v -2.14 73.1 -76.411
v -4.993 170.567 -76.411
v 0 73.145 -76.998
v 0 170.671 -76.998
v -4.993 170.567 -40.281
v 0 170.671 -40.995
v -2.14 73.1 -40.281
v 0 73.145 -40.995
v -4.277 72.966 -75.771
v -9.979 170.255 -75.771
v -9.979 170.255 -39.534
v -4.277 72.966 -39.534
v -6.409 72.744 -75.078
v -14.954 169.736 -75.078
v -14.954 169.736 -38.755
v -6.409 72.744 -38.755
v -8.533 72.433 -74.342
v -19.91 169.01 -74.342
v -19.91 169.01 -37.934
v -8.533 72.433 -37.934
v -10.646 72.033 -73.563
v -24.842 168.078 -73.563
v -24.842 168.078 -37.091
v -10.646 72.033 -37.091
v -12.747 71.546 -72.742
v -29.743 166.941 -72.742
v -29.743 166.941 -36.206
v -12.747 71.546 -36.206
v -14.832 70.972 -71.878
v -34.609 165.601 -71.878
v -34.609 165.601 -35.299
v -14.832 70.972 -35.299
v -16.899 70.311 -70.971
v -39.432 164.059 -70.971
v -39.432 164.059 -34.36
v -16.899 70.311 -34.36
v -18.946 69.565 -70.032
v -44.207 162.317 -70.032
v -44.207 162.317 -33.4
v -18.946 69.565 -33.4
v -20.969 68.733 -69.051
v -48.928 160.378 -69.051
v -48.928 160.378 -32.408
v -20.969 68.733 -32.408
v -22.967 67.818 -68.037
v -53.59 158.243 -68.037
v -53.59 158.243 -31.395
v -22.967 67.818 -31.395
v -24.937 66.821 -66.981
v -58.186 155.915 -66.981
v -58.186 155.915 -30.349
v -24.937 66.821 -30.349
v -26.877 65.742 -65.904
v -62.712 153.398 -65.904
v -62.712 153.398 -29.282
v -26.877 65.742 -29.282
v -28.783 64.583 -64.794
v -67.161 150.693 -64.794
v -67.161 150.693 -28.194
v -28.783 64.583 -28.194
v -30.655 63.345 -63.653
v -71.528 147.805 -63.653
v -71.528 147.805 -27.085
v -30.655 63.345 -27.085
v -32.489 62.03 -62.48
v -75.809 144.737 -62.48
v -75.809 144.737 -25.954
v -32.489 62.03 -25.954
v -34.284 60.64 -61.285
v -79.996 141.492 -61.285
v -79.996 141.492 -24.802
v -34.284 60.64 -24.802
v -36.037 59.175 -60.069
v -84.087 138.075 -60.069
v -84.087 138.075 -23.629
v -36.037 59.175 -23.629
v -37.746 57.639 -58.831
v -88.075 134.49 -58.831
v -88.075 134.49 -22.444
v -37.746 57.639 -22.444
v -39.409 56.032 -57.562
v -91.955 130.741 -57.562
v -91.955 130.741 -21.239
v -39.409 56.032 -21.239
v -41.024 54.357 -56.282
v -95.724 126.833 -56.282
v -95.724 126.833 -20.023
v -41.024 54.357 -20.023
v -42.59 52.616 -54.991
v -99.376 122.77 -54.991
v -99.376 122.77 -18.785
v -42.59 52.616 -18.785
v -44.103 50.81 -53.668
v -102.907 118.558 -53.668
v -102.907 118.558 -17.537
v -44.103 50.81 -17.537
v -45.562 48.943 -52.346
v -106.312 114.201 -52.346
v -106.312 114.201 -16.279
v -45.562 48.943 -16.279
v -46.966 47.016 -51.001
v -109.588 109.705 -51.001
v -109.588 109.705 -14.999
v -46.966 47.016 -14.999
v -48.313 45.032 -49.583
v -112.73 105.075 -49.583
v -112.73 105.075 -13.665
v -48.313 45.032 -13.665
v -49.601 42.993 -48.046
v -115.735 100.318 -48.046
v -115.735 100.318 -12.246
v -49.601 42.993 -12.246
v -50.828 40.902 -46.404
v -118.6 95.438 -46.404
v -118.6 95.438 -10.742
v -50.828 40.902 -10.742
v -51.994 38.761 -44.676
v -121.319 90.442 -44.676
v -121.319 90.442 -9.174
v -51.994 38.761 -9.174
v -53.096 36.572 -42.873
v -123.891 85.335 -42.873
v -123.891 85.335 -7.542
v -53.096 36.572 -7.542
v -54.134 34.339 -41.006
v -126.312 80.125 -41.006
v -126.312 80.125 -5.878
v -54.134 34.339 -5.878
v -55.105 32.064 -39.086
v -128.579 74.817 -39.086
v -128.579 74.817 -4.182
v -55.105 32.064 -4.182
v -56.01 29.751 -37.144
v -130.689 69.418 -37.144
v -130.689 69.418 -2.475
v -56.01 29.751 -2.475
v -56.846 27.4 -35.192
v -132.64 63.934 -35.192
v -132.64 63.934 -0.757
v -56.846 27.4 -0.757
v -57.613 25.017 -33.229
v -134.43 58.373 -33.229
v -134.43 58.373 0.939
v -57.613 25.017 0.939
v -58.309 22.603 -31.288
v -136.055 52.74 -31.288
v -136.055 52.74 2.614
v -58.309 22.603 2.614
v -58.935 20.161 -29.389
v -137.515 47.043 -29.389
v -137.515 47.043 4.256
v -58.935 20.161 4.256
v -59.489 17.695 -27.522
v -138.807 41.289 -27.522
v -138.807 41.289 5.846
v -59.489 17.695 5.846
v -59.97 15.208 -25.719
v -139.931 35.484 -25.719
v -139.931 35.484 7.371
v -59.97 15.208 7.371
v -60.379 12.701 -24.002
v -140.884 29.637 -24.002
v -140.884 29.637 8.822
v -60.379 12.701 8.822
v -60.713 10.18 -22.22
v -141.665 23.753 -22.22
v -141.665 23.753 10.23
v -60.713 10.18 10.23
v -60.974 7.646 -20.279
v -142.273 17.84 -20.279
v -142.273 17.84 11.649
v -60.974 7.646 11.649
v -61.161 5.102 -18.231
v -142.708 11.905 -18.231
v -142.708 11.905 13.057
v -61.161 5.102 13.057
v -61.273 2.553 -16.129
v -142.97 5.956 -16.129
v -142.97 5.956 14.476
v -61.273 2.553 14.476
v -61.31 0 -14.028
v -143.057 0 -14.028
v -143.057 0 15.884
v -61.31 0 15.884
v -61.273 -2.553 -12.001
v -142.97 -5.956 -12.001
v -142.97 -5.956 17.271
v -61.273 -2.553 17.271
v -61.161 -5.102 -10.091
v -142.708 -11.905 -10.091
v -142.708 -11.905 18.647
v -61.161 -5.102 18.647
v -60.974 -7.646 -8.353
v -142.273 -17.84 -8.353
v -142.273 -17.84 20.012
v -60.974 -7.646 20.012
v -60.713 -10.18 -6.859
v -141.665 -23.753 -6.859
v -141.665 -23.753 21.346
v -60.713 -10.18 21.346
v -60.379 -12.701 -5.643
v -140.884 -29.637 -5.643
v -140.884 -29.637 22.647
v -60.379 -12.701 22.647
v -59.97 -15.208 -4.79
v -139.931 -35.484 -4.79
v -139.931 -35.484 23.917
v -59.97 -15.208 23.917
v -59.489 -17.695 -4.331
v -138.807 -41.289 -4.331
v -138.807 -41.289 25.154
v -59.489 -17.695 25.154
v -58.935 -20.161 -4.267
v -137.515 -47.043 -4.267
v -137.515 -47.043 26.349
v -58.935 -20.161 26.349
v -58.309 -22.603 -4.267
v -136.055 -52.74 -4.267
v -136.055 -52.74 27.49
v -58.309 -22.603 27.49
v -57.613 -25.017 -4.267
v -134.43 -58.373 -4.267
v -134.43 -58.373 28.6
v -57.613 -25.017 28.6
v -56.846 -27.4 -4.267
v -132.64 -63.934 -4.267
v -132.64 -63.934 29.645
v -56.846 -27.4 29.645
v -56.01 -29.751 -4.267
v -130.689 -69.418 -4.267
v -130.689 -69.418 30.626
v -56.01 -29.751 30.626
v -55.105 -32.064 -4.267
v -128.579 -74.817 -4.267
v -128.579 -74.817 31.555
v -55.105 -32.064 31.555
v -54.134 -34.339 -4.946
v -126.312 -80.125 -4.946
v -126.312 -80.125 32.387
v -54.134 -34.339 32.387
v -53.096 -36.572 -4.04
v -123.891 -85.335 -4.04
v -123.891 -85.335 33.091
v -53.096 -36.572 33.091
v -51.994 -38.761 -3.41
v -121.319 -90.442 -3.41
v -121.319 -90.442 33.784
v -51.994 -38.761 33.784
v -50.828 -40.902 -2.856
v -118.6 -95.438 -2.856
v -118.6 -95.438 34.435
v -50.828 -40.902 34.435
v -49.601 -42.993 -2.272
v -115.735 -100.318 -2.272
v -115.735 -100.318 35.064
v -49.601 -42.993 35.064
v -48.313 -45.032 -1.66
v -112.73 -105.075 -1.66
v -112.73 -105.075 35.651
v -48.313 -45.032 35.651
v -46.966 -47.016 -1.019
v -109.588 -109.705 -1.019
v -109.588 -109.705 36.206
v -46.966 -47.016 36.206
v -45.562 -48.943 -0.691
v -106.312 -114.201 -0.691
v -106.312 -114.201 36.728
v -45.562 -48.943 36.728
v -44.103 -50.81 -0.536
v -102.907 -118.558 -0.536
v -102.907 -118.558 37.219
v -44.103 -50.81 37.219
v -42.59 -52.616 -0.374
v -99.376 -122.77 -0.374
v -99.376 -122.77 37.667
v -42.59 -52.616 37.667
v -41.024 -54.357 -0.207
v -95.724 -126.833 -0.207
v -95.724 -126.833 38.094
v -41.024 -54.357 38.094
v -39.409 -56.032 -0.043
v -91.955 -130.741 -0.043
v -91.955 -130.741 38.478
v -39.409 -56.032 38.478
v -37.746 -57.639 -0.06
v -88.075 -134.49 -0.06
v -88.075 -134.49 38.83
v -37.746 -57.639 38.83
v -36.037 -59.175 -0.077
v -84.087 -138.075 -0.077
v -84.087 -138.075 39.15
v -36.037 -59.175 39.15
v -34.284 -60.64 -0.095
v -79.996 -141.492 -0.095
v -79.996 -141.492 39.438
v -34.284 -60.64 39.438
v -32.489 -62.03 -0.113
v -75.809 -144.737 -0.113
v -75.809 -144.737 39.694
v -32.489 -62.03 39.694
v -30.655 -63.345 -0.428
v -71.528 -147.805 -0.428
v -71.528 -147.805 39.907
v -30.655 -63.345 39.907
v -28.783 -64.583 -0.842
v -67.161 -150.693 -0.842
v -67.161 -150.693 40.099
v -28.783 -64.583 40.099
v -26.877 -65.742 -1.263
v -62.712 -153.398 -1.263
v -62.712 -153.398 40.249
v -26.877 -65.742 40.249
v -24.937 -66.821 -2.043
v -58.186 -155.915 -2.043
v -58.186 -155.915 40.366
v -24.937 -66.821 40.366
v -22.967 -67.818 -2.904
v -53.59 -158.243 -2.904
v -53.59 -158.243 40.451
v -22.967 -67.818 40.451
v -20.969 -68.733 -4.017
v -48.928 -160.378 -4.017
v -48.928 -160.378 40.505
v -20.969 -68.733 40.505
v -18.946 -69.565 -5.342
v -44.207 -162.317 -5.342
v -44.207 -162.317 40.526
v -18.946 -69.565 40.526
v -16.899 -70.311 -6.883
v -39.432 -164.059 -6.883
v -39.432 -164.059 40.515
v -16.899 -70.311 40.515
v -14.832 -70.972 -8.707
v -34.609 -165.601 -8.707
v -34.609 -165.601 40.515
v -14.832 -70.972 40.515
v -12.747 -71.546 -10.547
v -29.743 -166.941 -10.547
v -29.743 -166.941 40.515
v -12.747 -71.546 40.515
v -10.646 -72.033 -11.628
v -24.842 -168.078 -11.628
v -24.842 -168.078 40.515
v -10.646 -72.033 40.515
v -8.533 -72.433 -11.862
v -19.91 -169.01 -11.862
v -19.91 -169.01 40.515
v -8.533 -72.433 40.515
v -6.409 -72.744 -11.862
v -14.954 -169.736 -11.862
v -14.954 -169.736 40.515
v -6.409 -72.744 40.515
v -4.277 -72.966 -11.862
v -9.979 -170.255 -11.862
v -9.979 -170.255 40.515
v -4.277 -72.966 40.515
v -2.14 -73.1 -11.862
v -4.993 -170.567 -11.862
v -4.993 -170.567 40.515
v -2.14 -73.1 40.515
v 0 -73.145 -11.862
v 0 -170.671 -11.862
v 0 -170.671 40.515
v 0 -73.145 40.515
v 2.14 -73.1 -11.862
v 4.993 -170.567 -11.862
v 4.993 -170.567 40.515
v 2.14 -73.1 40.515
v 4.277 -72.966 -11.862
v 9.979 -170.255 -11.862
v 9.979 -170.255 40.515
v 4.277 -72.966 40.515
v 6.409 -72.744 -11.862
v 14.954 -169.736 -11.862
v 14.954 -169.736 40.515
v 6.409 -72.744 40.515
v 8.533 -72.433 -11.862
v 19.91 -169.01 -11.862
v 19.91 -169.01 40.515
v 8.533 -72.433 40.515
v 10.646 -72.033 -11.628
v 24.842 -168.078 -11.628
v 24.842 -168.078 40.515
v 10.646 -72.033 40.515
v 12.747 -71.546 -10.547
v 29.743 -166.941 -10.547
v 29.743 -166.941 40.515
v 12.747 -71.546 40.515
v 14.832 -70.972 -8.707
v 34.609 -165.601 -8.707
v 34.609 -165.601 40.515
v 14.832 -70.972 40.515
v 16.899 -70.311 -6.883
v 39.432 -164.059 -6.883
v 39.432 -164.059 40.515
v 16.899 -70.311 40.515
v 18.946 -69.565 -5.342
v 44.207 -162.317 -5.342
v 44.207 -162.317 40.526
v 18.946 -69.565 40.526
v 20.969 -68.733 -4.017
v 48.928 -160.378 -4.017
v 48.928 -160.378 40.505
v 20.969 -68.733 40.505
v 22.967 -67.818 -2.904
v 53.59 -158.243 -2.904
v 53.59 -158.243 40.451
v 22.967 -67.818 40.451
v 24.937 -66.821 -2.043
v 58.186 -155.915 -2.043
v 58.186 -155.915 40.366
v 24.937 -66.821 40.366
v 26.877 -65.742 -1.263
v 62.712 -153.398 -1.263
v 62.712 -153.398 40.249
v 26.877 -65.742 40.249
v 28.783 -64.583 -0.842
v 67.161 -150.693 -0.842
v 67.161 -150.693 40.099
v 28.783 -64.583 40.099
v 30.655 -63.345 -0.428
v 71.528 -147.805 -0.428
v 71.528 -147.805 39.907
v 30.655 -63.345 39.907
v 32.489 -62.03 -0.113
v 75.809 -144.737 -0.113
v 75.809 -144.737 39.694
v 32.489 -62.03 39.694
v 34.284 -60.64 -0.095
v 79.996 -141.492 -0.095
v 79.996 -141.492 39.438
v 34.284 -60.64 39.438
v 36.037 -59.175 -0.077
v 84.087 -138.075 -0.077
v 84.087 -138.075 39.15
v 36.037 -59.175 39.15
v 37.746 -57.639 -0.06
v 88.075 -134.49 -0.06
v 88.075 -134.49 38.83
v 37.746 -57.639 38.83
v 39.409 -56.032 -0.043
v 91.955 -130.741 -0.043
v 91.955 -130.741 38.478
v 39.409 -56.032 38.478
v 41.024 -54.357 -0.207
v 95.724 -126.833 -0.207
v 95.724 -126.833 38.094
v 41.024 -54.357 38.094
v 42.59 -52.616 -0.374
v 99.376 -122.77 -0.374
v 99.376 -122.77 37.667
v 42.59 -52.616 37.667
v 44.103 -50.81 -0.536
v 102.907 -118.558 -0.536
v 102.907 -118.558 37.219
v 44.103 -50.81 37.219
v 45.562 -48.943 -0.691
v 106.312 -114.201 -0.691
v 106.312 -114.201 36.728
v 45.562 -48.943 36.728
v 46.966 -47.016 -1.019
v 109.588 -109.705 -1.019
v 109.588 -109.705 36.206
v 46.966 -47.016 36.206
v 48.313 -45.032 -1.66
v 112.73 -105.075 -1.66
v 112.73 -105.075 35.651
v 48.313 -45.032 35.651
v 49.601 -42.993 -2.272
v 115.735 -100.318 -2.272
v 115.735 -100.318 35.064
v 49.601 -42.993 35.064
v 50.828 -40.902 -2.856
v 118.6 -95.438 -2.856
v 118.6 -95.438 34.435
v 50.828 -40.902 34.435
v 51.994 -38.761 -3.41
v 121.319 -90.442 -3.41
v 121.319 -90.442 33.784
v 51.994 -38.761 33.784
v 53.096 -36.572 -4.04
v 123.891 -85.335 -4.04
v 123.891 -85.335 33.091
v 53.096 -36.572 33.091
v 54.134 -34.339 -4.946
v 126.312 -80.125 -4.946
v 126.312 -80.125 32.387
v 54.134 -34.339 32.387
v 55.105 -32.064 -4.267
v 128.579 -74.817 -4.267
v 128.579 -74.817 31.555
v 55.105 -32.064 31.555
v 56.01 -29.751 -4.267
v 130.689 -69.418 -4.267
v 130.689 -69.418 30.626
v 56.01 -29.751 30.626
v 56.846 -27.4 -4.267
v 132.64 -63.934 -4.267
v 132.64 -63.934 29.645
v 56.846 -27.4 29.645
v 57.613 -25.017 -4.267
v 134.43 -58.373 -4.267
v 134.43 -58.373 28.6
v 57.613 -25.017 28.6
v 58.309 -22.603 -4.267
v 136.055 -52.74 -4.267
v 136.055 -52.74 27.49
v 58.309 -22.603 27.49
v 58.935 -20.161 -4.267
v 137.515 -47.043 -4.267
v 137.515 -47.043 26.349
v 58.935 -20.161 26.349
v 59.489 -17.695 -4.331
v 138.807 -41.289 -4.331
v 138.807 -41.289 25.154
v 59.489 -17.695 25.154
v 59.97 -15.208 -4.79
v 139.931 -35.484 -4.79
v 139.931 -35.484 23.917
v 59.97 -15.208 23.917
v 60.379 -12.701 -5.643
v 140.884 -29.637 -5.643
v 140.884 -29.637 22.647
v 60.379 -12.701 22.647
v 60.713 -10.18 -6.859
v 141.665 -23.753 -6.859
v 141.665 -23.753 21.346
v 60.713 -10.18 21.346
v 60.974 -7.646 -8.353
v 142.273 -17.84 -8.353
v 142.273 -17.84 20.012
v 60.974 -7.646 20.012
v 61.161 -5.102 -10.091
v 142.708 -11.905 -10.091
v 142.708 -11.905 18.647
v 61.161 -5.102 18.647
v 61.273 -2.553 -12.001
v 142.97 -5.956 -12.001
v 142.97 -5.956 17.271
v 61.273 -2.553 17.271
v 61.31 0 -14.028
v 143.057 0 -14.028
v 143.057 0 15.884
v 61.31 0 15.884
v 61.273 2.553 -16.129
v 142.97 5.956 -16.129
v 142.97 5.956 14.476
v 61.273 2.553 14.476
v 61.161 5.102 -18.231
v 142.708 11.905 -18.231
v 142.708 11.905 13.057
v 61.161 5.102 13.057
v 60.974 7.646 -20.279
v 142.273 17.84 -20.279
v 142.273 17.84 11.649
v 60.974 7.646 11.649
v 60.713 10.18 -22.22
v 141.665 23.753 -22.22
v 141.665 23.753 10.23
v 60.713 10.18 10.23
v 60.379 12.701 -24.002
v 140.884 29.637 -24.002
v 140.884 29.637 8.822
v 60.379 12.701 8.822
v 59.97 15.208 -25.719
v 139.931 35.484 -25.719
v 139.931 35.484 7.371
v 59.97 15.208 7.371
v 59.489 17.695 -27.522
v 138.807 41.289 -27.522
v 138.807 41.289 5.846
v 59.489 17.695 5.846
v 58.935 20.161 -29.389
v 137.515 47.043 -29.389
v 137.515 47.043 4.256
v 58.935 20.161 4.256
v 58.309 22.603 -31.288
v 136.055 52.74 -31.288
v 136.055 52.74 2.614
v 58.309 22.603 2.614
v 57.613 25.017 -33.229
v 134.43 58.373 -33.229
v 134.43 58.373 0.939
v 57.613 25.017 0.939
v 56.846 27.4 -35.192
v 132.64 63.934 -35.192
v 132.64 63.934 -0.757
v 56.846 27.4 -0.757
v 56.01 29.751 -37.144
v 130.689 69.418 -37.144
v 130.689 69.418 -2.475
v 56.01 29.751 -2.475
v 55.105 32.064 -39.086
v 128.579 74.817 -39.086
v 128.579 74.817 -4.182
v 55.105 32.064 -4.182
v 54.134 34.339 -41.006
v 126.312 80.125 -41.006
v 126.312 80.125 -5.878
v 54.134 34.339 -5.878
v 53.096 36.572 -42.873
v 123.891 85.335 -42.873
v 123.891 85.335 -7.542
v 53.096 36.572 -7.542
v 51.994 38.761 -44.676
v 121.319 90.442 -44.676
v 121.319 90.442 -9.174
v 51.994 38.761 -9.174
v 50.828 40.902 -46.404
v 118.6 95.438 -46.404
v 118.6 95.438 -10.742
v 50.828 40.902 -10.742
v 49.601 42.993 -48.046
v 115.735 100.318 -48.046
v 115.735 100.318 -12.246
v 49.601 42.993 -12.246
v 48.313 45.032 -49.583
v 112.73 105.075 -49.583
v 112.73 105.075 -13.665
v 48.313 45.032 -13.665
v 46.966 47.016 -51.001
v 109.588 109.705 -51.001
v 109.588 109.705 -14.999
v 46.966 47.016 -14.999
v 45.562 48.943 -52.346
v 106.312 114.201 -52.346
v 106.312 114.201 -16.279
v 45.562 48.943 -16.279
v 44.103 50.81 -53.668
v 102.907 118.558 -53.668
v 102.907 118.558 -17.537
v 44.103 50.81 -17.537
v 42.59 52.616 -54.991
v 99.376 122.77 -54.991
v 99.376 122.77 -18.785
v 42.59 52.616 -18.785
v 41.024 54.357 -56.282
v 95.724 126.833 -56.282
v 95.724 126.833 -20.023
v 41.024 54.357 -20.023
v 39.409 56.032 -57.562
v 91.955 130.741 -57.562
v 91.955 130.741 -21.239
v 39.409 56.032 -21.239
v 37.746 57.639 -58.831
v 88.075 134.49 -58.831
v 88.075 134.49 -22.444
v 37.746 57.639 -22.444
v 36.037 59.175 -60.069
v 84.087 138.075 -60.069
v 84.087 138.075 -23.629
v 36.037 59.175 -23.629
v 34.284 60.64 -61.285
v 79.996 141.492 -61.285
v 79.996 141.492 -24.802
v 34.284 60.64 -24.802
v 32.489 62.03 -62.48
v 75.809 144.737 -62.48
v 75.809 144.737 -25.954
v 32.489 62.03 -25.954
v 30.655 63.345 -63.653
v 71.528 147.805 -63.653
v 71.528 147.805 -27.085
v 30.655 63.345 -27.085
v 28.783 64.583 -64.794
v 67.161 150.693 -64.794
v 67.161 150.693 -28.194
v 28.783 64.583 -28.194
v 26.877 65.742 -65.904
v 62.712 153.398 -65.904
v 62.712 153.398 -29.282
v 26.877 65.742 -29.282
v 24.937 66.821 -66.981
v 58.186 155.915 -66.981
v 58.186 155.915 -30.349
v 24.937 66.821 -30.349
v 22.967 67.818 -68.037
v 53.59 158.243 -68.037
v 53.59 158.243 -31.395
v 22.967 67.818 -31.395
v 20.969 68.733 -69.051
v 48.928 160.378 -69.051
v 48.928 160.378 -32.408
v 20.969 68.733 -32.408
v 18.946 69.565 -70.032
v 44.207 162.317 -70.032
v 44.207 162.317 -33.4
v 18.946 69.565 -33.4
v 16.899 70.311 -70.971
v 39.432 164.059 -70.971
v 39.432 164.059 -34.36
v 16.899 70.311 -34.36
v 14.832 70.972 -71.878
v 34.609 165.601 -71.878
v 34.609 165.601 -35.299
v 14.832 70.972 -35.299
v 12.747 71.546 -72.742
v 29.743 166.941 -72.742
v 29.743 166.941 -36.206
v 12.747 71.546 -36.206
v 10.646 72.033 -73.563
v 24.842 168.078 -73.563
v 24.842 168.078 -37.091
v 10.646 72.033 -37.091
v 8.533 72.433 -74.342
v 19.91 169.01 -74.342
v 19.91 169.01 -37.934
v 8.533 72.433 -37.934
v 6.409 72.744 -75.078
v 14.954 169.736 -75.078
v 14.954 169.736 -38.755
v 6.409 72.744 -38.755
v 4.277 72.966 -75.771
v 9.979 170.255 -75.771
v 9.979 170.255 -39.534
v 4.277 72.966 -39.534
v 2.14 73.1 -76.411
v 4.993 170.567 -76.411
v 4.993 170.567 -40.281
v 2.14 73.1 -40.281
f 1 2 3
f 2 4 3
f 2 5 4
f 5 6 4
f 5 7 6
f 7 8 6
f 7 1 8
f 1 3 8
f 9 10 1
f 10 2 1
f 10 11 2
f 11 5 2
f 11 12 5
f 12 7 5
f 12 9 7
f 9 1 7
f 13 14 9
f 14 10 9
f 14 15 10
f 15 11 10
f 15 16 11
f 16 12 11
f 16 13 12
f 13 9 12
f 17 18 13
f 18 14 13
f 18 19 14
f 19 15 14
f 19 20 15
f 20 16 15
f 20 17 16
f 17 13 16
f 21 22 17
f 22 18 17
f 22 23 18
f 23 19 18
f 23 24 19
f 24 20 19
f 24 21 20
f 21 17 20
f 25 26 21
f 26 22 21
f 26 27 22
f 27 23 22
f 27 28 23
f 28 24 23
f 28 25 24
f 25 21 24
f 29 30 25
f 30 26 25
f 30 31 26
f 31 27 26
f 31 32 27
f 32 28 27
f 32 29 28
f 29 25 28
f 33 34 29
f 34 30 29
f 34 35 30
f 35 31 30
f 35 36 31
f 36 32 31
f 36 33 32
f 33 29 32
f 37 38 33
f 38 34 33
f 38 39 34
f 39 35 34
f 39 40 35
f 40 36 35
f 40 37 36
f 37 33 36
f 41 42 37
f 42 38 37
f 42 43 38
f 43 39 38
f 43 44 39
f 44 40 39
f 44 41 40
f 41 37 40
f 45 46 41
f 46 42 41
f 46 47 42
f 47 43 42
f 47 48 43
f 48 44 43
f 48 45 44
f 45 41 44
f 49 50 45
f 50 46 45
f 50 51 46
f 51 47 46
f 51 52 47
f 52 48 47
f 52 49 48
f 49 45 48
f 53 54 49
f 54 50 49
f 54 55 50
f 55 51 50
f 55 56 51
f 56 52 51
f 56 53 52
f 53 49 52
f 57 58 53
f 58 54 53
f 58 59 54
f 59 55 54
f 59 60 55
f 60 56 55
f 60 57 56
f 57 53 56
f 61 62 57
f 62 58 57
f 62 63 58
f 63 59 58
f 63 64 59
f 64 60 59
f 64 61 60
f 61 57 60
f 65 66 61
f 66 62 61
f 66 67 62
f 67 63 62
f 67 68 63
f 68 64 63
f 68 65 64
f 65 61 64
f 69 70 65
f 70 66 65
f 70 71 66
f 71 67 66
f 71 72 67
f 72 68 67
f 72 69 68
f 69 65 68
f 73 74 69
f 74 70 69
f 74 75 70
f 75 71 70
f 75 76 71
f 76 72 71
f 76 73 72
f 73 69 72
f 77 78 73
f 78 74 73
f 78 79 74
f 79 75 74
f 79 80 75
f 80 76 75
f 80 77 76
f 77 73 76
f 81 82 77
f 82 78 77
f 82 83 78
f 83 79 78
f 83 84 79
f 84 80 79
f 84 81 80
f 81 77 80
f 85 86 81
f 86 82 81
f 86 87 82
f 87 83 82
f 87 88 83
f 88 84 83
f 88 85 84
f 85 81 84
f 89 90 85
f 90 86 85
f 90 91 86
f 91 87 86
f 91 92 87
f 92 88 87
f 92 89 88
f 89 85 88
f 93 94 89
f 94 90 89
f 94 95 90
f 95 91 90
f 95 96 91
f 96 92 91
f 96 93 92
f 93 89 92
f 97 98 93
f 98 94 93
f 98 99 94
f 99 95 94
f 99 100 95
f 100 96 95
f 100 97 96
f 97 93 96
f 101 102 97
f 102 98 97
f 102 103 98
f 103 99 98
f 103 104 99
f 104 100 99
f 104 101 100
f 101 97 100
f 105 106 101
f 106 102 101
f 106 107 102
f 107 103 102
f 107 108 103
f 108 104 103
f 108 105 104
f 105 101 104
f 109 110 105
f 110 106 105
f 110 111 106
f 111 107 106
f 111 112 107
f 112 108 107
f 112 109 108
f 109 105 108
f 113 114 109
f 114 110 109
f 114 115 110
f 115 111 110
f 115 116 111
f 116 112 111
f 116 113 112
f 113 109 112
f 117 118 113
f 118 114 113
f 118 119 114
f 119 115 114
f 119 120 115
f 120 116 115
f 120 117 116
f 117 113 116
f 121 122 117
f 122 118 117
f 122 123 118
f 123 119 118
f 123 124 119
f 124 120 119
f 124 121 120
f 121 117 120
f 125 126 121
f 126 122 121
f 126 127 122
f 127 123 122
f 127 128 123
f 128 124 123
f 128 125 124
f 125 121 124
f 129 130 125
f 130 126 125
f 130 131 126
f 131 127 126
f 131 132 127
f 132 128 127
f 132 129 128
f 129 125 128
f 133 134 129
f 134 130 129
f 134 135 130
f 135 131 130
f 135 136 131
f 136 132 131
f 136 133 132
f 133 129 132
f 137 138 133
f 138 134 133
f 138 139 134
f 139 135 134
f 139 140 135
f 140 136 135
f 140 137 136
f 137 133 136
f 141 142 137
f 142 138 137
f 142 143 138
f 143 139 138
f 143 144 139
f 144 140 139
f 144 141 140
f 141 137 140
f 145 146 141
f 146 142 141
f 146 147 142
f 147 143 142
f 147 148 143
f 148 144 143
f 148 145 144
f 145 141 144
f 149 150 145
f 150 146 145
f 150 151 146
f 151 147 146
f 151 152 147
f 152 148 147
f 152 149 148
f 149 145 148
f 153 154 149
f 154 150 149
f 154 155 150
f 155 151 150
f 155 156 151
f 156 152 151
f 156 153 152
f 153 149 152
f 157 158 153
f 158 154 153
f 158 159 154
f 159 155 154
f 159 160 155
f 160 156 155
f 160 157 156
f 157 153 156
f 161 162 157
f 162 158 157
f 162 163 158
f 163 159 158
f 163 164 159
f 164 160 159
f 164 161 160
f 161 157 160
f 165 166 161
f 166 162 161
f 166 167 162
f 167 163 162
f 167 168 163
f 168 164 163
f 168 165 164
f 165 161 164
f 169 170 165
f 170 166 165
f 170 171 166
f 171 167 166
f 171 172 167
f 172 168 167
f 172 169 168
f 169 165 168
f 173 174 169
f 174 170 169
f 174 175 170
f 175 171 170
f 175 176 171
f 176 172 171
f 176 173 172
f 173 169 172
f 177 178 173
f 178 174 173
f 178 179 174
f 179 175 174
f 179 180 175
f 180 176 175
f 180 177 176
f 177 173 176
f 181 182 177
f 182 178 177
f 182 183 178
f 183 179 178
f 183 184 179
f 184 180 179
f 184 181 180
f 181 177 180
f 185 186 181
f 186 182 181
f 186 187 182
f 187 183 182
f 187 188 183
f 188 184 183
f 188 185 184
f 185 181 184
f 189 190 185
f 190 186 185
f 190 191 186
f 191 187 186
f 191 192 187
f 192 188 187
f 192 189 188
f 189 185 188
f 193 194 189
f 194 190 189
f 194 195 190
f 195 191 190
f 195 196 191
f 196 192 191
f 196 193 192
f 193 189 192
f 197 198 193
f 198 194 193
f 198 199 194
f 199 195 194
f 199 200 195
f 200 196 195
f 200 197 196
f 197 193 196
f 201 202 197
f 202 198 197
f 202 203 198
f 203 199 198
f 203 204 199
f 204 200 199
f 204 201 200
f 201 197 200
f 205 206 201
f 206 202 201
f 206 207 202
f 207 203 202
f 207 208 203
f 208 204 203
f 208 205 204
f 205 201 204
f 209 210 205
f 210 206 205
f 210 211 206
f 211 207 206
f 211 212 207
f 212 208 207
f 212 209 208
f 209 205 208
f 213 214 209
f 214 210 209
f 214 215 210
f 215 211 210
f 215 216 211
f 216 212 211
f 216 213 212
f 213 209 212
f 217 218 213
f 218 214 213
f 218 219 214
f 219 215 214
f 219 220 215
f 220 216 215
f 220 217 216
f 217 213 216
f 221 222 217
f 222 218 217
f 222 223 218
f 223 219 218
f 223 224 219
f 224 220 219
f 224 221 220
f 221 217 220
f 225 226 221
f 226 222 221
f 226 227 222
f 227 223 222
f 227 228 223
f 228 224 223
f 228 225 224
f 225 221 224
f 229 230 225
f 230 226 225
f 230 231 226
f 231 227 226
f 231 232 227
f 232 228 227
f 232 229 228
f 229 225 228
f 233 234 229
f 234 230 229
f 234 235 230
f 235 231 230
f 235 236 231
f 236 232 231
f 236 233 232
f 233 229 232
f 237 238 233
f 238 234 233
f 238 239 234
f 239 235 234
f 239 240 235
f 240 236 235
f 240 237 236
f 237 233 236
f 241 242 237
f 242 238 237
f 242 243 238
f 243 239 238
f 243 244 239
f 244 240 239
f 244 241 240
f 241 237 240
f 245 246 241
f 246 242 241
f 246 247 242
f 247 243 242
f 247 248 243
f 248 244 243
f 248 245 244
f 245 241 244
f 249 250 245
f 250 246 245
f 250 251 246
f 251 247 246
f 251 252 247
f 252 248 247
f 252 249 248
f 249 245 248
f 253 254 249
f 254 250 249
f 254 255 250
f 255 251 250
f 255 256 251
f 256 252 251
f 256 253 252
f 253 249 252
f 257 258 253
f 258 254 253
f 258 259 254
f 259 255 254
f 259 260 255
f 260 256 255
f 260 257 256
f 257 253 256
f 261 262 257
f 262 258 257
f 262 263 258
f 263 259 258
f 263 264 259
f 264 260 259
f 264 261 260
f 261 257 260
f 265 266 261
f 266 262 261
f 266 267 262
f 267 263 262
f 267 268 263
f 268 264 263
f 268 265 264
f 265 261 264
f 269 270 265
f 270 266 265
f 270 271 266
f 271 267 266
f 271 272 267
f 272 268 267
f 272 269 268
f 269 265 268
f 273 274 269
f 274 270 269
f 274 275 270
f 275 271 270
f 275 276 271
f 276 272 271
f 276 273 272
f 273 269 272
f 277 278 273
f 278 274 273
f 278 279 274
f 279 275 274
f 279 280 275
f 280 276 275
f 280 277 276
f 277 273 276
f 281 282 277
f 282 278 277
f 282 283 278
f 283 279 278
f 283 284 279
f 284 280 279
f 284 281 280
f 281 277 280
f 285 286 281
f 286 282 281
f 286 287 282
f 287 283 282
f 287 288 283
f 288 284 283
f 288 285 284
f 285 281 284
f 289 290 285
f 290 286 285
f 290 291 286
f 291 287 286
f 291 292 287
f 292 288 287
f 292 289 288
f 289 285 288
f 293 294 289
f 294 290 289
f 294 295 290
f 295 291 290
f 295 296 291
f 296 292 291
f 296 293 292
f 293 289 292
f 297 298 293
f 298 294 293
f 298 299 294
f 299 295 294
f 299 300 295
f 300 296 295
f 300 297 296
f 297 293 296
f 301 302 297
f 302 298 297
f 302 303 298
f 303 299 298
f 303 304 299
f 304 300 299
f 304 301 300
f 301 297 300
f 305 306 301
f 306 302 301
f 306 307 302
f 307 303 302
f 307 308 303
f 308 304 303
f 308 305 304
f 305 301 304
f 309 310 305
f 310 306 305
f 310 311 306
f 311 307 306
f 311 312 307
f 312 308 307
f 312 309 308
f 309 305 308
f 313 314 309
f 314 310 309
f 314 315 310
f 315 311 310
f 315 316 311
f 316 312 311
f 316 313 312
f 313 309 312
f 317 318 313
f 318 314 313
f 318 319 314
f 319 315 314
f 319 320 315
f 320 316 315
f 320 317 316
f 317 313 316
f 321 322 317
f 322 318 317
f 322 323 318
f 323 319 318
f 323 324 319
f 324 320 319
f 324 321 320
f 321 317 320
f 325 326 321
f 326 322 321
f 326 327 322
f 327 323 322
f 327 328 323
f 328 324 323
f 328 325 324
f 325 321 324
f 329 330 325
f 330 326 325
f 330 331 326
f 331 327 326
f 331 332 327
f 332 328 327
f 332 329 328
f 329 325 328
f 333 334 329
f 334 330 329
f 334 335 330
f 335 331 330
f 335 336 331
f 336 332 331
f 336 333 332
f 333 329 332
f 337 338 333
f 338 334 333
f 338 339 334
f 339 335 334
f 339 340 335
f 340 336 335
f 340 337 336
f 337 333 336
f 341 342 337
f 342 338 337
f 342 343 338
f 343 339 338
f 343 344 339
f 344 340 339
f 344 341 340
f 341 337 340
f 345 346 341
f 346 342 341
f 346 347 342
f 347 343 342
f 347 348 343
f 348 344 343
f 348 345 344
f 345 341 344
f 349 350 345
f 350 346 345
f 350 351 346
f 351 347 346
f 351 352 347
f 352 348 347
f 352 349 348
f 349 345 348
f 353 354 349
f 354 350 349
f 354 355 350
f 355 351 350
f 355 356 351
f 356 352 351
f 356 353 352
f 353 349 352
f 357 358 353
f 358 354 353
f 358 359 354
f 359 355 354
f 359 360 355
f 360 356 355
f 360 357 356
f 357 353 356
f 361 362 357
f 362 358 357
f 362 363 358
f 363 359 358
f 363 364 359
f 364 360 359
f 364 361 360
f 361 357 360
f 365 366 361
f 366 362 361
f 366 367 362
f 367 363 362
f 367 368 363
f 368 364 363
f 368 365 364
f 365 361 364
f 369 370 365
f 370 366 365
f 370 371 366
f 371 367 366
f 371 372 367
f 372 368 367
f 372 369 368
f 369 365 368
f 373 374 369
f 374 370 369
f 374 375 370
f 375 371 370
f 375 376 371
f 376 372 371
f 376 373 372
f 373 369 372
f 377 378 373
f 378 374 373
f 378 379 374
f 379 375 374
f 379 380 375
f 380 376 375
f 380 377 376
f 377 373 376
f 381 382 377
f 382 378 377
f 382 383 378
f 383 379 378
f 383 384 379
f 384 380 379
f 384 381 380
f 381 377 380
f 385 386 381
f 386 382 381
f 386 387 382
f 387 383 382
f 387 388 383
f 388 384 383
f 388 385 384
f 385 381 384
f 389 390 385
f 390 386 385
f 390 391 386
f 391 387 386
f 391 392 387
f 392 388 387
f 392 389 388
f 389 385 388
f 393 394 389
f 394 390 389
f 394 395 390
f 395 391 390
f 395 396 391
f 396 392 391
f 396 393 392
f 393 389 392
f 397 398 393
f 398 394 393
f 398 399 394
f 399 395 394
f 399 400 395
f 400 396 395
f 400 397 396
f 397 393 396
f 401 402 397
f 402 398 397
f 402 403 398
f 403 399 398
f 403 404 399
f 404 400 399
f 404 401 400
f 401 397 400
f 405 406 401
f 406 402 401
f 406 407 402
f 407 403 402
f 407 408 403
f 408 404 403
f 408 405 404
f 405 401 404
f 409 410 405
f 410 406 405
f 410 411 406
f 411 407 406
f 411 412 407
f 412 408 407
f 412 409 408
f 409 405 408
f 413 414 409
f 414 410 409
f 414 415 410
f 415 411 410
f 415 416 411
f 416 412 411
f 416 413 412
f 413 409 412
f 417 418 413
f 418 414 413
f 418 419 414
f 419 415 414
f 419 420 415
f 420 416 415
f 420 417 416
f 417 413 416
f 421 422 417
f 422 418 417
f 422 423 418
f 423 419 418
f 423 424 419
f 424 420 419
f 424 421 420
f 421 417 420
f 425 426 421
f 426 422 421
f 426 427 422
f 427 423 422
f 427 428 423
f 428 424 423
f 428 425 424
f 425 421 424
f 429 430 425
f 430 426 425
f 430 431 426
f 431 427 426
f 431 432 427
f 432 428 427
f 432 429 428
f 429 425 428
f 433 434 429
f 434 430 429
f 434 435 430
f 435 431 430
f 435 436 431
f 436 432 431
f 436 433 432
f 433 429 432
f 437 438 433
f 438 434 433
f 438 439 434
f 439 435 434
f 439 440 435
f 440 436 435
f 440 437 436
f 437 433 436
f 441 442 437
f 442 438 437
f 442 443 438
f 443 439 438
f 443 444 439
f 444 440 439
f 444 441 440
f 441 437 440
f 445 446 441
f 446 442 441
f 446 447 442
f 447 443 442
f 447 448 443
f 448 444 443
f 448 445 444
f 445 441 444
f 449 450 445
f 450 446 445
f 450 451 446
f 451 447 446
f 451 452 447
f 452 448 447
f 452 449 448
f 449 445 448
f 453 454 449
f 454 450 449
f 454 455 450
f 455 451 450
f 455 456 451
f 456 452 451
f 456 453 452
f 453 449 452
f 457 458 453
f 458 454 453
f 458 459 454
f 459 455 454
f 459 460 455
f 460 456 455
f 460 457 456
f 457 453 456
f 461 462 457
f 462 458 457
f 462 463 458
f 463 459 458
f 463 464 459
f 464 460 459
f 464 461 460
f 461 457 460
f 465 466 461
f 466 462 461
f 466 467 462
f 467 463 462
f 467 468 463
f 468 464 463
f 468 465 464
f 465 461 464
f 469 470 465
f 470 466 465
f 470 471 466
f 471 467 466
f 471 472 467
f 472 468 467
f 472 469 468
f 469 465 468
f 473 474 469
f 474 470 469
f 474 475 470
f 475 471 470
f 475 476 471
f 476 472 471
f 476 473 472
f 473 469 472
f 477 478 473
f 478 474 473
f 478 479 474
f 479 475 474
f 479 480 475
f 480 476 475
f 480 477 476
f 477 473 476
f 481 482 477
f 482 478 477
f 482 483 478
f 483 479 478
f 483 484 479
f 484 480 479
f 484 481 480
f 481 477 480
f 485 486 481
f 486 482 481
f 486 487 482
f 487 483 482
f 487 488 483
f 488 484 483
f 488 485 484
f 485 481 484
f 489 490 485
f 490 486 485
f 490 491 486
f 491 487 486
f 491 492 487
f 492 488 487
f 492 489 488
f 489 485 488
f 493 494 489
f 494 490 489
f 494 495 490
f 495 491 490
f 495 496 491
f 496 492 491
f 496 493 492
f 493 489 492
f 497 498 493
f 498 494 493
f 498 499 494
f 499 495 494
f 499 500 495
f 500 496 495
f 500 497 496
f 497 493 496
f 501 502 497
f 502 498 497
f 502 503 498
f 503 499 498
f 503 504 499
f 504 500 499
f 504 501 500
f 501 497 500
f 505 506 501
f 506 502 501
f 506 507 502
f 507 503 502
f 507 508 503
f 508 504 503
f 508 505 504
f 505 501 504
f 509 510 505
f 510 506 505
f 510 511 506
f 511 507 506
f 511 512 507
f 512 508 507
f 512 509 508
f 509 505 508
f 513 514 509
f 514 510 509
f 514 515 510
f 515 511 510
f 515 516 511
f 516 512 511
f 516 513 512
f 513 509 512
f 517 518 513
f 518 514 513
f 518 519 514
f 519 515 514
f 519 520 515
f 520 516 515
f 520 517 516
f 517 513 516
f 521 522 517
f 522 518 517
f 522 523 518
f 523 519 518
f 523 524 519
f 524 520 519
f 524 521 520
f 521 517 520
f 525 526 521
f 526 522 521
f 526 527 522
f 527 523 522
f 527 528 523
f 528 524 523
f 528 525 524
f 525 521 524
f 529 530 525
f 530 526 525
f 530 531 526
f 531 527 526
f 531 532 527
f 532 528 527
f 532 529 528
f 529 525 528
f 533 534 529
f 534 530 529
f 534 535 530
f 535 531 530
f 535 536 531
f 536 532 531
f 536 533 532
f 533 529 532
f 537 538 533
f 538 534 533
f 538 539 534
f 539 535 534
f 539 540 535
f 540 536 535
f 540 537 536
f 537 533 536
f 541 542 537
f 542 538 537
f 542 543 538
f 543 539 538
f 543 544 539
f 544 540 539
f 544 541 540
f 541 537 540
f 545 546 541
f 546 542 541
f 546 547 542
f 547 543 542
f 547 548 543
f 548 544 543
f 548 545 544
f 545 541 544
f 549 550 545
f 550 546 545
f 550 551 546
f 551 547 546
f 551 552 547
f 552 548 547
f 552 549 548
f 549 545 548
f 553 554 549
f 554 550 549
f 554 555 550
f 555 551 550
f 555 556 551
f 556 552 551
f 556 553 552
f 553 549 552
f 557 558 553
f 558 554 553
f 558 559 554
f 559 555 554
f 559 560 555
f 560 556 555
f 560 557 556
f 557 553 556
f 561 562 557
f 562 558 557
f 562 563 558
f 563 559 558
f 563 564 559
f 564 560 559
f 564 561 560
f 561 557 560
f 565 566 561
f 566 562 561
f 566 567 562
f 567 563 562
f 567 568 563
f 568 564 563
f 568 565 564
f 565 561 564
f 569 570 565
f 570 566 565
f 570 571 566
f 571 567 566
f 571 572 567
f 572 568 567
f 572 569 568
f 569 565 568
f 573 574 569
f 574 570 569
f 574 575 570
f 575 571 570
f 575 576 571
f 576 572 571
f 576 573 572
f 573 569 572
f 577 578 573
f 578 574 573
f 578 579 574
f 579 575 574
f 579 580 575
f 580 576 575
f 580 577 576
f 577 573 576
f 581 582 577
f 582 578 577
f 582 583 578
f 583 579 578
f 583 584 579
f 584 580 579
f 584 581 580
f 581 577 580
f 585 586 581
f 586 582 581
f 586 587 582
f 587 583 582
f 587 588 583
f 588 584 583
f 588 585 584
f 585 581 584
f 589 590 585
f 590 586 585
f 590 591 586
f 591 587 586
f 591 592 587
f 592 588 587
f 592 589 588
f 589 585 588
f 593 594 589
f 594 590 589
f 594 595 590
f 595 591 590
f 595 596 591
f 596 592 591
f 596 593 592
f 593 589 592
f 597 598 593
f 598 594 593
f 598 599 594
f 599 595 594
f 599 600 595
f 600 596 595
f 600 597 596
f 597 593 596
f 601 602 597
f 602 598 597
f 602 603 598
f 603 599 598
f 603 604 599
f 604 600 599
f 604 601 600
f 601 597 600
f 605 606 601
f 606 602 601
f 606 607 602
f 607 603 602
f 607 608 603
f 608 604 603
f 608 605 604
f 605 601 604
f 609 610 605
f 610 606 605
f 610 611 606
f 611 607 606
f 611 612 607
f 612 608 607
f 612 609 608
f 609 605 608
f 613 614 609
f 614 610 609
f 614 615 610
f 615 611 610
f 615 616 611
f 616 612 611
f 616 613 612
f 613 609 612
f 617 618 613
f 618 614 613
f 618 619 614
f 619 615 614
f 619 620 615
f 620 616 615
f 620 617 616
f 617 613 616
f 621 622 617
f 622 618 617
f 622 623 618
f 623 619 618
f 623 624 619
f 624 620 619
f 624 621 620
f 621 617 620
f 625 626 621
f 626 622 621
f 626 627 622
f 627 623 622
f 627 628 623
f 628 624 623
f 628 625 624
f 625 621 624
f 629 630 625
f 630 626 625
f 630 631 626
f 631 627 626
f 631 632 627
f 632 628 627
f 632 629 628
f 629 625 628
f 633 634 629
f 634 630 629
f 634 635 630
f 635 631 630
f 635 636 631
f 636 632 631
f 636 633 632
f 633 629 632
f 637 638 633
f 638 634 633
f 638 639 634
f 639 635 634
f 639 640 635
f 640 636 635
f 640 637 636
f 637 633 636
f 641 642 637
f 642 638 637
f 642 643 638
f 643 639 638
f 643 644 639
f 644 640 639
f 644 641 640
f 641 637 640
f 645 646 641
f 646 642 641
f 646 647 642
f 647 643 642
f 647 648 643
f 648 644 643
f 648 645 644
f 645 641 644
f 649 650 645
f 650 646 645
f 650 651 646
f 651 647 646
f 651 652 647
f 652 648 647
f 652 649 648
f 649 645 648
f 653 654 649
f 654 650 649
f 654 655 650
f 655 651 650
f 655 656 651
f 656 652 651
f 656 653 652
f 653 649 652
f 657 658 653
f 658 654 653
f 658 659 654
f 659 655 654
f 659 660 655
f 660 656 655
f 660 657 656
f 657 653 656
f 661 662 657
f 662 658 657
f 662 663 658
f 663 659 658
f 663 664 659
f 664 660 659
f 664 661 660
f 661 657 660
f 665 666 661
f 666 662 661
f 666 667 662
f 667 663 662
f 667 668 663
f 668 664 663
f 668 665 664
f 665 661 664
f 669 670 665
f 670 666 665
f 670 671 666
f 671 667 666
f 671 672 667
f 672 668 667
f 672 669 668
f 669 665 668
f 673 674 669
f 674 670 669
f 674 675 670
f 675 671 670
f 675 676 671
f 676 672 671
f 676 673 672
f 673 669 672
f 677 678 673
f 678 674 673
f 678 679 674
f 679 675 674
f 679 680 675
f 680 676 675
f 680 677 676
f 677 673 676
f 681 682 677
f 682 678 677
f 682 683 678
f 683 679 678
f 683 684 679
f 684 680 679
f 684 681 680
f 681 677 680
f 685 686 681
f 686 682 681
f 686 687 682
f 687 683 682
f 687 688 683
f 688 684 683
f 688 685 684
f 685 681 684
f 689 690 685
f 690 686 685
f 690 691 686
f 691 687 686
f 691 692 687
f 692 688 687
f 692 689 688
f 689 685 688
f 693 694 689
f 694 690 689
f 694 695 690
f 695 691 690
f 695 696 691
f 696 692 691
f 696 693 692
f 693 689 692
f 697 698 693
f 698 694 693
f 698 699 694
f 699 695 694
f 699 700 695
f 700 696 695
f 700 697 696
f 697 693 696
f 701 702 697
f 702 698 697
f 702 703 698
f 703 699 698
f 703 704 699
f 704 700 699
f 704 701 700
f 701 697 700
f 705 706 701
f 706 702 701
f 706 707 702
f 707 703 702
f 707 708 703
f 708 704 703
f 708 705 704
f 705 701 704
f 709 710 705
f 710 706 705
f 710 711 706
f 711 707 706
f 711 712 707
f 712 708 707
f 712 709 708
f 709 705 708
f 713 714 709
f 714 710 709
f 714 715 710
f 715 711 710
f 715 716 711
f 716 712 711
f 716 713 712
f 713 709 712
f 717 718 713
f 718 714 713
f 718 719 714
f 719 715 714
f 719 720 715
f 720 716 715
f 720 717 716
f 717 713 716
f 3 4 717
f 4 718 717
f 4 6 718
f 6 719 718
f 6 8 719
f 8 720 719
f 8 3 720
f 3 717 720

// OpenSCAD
include <winged_helmet_v11.scad>
part = "none"; build = "full";
th = ths_ring();
band_zone([for (a = th) band_bot(a)], [for (a = th) band_top(a)]);
